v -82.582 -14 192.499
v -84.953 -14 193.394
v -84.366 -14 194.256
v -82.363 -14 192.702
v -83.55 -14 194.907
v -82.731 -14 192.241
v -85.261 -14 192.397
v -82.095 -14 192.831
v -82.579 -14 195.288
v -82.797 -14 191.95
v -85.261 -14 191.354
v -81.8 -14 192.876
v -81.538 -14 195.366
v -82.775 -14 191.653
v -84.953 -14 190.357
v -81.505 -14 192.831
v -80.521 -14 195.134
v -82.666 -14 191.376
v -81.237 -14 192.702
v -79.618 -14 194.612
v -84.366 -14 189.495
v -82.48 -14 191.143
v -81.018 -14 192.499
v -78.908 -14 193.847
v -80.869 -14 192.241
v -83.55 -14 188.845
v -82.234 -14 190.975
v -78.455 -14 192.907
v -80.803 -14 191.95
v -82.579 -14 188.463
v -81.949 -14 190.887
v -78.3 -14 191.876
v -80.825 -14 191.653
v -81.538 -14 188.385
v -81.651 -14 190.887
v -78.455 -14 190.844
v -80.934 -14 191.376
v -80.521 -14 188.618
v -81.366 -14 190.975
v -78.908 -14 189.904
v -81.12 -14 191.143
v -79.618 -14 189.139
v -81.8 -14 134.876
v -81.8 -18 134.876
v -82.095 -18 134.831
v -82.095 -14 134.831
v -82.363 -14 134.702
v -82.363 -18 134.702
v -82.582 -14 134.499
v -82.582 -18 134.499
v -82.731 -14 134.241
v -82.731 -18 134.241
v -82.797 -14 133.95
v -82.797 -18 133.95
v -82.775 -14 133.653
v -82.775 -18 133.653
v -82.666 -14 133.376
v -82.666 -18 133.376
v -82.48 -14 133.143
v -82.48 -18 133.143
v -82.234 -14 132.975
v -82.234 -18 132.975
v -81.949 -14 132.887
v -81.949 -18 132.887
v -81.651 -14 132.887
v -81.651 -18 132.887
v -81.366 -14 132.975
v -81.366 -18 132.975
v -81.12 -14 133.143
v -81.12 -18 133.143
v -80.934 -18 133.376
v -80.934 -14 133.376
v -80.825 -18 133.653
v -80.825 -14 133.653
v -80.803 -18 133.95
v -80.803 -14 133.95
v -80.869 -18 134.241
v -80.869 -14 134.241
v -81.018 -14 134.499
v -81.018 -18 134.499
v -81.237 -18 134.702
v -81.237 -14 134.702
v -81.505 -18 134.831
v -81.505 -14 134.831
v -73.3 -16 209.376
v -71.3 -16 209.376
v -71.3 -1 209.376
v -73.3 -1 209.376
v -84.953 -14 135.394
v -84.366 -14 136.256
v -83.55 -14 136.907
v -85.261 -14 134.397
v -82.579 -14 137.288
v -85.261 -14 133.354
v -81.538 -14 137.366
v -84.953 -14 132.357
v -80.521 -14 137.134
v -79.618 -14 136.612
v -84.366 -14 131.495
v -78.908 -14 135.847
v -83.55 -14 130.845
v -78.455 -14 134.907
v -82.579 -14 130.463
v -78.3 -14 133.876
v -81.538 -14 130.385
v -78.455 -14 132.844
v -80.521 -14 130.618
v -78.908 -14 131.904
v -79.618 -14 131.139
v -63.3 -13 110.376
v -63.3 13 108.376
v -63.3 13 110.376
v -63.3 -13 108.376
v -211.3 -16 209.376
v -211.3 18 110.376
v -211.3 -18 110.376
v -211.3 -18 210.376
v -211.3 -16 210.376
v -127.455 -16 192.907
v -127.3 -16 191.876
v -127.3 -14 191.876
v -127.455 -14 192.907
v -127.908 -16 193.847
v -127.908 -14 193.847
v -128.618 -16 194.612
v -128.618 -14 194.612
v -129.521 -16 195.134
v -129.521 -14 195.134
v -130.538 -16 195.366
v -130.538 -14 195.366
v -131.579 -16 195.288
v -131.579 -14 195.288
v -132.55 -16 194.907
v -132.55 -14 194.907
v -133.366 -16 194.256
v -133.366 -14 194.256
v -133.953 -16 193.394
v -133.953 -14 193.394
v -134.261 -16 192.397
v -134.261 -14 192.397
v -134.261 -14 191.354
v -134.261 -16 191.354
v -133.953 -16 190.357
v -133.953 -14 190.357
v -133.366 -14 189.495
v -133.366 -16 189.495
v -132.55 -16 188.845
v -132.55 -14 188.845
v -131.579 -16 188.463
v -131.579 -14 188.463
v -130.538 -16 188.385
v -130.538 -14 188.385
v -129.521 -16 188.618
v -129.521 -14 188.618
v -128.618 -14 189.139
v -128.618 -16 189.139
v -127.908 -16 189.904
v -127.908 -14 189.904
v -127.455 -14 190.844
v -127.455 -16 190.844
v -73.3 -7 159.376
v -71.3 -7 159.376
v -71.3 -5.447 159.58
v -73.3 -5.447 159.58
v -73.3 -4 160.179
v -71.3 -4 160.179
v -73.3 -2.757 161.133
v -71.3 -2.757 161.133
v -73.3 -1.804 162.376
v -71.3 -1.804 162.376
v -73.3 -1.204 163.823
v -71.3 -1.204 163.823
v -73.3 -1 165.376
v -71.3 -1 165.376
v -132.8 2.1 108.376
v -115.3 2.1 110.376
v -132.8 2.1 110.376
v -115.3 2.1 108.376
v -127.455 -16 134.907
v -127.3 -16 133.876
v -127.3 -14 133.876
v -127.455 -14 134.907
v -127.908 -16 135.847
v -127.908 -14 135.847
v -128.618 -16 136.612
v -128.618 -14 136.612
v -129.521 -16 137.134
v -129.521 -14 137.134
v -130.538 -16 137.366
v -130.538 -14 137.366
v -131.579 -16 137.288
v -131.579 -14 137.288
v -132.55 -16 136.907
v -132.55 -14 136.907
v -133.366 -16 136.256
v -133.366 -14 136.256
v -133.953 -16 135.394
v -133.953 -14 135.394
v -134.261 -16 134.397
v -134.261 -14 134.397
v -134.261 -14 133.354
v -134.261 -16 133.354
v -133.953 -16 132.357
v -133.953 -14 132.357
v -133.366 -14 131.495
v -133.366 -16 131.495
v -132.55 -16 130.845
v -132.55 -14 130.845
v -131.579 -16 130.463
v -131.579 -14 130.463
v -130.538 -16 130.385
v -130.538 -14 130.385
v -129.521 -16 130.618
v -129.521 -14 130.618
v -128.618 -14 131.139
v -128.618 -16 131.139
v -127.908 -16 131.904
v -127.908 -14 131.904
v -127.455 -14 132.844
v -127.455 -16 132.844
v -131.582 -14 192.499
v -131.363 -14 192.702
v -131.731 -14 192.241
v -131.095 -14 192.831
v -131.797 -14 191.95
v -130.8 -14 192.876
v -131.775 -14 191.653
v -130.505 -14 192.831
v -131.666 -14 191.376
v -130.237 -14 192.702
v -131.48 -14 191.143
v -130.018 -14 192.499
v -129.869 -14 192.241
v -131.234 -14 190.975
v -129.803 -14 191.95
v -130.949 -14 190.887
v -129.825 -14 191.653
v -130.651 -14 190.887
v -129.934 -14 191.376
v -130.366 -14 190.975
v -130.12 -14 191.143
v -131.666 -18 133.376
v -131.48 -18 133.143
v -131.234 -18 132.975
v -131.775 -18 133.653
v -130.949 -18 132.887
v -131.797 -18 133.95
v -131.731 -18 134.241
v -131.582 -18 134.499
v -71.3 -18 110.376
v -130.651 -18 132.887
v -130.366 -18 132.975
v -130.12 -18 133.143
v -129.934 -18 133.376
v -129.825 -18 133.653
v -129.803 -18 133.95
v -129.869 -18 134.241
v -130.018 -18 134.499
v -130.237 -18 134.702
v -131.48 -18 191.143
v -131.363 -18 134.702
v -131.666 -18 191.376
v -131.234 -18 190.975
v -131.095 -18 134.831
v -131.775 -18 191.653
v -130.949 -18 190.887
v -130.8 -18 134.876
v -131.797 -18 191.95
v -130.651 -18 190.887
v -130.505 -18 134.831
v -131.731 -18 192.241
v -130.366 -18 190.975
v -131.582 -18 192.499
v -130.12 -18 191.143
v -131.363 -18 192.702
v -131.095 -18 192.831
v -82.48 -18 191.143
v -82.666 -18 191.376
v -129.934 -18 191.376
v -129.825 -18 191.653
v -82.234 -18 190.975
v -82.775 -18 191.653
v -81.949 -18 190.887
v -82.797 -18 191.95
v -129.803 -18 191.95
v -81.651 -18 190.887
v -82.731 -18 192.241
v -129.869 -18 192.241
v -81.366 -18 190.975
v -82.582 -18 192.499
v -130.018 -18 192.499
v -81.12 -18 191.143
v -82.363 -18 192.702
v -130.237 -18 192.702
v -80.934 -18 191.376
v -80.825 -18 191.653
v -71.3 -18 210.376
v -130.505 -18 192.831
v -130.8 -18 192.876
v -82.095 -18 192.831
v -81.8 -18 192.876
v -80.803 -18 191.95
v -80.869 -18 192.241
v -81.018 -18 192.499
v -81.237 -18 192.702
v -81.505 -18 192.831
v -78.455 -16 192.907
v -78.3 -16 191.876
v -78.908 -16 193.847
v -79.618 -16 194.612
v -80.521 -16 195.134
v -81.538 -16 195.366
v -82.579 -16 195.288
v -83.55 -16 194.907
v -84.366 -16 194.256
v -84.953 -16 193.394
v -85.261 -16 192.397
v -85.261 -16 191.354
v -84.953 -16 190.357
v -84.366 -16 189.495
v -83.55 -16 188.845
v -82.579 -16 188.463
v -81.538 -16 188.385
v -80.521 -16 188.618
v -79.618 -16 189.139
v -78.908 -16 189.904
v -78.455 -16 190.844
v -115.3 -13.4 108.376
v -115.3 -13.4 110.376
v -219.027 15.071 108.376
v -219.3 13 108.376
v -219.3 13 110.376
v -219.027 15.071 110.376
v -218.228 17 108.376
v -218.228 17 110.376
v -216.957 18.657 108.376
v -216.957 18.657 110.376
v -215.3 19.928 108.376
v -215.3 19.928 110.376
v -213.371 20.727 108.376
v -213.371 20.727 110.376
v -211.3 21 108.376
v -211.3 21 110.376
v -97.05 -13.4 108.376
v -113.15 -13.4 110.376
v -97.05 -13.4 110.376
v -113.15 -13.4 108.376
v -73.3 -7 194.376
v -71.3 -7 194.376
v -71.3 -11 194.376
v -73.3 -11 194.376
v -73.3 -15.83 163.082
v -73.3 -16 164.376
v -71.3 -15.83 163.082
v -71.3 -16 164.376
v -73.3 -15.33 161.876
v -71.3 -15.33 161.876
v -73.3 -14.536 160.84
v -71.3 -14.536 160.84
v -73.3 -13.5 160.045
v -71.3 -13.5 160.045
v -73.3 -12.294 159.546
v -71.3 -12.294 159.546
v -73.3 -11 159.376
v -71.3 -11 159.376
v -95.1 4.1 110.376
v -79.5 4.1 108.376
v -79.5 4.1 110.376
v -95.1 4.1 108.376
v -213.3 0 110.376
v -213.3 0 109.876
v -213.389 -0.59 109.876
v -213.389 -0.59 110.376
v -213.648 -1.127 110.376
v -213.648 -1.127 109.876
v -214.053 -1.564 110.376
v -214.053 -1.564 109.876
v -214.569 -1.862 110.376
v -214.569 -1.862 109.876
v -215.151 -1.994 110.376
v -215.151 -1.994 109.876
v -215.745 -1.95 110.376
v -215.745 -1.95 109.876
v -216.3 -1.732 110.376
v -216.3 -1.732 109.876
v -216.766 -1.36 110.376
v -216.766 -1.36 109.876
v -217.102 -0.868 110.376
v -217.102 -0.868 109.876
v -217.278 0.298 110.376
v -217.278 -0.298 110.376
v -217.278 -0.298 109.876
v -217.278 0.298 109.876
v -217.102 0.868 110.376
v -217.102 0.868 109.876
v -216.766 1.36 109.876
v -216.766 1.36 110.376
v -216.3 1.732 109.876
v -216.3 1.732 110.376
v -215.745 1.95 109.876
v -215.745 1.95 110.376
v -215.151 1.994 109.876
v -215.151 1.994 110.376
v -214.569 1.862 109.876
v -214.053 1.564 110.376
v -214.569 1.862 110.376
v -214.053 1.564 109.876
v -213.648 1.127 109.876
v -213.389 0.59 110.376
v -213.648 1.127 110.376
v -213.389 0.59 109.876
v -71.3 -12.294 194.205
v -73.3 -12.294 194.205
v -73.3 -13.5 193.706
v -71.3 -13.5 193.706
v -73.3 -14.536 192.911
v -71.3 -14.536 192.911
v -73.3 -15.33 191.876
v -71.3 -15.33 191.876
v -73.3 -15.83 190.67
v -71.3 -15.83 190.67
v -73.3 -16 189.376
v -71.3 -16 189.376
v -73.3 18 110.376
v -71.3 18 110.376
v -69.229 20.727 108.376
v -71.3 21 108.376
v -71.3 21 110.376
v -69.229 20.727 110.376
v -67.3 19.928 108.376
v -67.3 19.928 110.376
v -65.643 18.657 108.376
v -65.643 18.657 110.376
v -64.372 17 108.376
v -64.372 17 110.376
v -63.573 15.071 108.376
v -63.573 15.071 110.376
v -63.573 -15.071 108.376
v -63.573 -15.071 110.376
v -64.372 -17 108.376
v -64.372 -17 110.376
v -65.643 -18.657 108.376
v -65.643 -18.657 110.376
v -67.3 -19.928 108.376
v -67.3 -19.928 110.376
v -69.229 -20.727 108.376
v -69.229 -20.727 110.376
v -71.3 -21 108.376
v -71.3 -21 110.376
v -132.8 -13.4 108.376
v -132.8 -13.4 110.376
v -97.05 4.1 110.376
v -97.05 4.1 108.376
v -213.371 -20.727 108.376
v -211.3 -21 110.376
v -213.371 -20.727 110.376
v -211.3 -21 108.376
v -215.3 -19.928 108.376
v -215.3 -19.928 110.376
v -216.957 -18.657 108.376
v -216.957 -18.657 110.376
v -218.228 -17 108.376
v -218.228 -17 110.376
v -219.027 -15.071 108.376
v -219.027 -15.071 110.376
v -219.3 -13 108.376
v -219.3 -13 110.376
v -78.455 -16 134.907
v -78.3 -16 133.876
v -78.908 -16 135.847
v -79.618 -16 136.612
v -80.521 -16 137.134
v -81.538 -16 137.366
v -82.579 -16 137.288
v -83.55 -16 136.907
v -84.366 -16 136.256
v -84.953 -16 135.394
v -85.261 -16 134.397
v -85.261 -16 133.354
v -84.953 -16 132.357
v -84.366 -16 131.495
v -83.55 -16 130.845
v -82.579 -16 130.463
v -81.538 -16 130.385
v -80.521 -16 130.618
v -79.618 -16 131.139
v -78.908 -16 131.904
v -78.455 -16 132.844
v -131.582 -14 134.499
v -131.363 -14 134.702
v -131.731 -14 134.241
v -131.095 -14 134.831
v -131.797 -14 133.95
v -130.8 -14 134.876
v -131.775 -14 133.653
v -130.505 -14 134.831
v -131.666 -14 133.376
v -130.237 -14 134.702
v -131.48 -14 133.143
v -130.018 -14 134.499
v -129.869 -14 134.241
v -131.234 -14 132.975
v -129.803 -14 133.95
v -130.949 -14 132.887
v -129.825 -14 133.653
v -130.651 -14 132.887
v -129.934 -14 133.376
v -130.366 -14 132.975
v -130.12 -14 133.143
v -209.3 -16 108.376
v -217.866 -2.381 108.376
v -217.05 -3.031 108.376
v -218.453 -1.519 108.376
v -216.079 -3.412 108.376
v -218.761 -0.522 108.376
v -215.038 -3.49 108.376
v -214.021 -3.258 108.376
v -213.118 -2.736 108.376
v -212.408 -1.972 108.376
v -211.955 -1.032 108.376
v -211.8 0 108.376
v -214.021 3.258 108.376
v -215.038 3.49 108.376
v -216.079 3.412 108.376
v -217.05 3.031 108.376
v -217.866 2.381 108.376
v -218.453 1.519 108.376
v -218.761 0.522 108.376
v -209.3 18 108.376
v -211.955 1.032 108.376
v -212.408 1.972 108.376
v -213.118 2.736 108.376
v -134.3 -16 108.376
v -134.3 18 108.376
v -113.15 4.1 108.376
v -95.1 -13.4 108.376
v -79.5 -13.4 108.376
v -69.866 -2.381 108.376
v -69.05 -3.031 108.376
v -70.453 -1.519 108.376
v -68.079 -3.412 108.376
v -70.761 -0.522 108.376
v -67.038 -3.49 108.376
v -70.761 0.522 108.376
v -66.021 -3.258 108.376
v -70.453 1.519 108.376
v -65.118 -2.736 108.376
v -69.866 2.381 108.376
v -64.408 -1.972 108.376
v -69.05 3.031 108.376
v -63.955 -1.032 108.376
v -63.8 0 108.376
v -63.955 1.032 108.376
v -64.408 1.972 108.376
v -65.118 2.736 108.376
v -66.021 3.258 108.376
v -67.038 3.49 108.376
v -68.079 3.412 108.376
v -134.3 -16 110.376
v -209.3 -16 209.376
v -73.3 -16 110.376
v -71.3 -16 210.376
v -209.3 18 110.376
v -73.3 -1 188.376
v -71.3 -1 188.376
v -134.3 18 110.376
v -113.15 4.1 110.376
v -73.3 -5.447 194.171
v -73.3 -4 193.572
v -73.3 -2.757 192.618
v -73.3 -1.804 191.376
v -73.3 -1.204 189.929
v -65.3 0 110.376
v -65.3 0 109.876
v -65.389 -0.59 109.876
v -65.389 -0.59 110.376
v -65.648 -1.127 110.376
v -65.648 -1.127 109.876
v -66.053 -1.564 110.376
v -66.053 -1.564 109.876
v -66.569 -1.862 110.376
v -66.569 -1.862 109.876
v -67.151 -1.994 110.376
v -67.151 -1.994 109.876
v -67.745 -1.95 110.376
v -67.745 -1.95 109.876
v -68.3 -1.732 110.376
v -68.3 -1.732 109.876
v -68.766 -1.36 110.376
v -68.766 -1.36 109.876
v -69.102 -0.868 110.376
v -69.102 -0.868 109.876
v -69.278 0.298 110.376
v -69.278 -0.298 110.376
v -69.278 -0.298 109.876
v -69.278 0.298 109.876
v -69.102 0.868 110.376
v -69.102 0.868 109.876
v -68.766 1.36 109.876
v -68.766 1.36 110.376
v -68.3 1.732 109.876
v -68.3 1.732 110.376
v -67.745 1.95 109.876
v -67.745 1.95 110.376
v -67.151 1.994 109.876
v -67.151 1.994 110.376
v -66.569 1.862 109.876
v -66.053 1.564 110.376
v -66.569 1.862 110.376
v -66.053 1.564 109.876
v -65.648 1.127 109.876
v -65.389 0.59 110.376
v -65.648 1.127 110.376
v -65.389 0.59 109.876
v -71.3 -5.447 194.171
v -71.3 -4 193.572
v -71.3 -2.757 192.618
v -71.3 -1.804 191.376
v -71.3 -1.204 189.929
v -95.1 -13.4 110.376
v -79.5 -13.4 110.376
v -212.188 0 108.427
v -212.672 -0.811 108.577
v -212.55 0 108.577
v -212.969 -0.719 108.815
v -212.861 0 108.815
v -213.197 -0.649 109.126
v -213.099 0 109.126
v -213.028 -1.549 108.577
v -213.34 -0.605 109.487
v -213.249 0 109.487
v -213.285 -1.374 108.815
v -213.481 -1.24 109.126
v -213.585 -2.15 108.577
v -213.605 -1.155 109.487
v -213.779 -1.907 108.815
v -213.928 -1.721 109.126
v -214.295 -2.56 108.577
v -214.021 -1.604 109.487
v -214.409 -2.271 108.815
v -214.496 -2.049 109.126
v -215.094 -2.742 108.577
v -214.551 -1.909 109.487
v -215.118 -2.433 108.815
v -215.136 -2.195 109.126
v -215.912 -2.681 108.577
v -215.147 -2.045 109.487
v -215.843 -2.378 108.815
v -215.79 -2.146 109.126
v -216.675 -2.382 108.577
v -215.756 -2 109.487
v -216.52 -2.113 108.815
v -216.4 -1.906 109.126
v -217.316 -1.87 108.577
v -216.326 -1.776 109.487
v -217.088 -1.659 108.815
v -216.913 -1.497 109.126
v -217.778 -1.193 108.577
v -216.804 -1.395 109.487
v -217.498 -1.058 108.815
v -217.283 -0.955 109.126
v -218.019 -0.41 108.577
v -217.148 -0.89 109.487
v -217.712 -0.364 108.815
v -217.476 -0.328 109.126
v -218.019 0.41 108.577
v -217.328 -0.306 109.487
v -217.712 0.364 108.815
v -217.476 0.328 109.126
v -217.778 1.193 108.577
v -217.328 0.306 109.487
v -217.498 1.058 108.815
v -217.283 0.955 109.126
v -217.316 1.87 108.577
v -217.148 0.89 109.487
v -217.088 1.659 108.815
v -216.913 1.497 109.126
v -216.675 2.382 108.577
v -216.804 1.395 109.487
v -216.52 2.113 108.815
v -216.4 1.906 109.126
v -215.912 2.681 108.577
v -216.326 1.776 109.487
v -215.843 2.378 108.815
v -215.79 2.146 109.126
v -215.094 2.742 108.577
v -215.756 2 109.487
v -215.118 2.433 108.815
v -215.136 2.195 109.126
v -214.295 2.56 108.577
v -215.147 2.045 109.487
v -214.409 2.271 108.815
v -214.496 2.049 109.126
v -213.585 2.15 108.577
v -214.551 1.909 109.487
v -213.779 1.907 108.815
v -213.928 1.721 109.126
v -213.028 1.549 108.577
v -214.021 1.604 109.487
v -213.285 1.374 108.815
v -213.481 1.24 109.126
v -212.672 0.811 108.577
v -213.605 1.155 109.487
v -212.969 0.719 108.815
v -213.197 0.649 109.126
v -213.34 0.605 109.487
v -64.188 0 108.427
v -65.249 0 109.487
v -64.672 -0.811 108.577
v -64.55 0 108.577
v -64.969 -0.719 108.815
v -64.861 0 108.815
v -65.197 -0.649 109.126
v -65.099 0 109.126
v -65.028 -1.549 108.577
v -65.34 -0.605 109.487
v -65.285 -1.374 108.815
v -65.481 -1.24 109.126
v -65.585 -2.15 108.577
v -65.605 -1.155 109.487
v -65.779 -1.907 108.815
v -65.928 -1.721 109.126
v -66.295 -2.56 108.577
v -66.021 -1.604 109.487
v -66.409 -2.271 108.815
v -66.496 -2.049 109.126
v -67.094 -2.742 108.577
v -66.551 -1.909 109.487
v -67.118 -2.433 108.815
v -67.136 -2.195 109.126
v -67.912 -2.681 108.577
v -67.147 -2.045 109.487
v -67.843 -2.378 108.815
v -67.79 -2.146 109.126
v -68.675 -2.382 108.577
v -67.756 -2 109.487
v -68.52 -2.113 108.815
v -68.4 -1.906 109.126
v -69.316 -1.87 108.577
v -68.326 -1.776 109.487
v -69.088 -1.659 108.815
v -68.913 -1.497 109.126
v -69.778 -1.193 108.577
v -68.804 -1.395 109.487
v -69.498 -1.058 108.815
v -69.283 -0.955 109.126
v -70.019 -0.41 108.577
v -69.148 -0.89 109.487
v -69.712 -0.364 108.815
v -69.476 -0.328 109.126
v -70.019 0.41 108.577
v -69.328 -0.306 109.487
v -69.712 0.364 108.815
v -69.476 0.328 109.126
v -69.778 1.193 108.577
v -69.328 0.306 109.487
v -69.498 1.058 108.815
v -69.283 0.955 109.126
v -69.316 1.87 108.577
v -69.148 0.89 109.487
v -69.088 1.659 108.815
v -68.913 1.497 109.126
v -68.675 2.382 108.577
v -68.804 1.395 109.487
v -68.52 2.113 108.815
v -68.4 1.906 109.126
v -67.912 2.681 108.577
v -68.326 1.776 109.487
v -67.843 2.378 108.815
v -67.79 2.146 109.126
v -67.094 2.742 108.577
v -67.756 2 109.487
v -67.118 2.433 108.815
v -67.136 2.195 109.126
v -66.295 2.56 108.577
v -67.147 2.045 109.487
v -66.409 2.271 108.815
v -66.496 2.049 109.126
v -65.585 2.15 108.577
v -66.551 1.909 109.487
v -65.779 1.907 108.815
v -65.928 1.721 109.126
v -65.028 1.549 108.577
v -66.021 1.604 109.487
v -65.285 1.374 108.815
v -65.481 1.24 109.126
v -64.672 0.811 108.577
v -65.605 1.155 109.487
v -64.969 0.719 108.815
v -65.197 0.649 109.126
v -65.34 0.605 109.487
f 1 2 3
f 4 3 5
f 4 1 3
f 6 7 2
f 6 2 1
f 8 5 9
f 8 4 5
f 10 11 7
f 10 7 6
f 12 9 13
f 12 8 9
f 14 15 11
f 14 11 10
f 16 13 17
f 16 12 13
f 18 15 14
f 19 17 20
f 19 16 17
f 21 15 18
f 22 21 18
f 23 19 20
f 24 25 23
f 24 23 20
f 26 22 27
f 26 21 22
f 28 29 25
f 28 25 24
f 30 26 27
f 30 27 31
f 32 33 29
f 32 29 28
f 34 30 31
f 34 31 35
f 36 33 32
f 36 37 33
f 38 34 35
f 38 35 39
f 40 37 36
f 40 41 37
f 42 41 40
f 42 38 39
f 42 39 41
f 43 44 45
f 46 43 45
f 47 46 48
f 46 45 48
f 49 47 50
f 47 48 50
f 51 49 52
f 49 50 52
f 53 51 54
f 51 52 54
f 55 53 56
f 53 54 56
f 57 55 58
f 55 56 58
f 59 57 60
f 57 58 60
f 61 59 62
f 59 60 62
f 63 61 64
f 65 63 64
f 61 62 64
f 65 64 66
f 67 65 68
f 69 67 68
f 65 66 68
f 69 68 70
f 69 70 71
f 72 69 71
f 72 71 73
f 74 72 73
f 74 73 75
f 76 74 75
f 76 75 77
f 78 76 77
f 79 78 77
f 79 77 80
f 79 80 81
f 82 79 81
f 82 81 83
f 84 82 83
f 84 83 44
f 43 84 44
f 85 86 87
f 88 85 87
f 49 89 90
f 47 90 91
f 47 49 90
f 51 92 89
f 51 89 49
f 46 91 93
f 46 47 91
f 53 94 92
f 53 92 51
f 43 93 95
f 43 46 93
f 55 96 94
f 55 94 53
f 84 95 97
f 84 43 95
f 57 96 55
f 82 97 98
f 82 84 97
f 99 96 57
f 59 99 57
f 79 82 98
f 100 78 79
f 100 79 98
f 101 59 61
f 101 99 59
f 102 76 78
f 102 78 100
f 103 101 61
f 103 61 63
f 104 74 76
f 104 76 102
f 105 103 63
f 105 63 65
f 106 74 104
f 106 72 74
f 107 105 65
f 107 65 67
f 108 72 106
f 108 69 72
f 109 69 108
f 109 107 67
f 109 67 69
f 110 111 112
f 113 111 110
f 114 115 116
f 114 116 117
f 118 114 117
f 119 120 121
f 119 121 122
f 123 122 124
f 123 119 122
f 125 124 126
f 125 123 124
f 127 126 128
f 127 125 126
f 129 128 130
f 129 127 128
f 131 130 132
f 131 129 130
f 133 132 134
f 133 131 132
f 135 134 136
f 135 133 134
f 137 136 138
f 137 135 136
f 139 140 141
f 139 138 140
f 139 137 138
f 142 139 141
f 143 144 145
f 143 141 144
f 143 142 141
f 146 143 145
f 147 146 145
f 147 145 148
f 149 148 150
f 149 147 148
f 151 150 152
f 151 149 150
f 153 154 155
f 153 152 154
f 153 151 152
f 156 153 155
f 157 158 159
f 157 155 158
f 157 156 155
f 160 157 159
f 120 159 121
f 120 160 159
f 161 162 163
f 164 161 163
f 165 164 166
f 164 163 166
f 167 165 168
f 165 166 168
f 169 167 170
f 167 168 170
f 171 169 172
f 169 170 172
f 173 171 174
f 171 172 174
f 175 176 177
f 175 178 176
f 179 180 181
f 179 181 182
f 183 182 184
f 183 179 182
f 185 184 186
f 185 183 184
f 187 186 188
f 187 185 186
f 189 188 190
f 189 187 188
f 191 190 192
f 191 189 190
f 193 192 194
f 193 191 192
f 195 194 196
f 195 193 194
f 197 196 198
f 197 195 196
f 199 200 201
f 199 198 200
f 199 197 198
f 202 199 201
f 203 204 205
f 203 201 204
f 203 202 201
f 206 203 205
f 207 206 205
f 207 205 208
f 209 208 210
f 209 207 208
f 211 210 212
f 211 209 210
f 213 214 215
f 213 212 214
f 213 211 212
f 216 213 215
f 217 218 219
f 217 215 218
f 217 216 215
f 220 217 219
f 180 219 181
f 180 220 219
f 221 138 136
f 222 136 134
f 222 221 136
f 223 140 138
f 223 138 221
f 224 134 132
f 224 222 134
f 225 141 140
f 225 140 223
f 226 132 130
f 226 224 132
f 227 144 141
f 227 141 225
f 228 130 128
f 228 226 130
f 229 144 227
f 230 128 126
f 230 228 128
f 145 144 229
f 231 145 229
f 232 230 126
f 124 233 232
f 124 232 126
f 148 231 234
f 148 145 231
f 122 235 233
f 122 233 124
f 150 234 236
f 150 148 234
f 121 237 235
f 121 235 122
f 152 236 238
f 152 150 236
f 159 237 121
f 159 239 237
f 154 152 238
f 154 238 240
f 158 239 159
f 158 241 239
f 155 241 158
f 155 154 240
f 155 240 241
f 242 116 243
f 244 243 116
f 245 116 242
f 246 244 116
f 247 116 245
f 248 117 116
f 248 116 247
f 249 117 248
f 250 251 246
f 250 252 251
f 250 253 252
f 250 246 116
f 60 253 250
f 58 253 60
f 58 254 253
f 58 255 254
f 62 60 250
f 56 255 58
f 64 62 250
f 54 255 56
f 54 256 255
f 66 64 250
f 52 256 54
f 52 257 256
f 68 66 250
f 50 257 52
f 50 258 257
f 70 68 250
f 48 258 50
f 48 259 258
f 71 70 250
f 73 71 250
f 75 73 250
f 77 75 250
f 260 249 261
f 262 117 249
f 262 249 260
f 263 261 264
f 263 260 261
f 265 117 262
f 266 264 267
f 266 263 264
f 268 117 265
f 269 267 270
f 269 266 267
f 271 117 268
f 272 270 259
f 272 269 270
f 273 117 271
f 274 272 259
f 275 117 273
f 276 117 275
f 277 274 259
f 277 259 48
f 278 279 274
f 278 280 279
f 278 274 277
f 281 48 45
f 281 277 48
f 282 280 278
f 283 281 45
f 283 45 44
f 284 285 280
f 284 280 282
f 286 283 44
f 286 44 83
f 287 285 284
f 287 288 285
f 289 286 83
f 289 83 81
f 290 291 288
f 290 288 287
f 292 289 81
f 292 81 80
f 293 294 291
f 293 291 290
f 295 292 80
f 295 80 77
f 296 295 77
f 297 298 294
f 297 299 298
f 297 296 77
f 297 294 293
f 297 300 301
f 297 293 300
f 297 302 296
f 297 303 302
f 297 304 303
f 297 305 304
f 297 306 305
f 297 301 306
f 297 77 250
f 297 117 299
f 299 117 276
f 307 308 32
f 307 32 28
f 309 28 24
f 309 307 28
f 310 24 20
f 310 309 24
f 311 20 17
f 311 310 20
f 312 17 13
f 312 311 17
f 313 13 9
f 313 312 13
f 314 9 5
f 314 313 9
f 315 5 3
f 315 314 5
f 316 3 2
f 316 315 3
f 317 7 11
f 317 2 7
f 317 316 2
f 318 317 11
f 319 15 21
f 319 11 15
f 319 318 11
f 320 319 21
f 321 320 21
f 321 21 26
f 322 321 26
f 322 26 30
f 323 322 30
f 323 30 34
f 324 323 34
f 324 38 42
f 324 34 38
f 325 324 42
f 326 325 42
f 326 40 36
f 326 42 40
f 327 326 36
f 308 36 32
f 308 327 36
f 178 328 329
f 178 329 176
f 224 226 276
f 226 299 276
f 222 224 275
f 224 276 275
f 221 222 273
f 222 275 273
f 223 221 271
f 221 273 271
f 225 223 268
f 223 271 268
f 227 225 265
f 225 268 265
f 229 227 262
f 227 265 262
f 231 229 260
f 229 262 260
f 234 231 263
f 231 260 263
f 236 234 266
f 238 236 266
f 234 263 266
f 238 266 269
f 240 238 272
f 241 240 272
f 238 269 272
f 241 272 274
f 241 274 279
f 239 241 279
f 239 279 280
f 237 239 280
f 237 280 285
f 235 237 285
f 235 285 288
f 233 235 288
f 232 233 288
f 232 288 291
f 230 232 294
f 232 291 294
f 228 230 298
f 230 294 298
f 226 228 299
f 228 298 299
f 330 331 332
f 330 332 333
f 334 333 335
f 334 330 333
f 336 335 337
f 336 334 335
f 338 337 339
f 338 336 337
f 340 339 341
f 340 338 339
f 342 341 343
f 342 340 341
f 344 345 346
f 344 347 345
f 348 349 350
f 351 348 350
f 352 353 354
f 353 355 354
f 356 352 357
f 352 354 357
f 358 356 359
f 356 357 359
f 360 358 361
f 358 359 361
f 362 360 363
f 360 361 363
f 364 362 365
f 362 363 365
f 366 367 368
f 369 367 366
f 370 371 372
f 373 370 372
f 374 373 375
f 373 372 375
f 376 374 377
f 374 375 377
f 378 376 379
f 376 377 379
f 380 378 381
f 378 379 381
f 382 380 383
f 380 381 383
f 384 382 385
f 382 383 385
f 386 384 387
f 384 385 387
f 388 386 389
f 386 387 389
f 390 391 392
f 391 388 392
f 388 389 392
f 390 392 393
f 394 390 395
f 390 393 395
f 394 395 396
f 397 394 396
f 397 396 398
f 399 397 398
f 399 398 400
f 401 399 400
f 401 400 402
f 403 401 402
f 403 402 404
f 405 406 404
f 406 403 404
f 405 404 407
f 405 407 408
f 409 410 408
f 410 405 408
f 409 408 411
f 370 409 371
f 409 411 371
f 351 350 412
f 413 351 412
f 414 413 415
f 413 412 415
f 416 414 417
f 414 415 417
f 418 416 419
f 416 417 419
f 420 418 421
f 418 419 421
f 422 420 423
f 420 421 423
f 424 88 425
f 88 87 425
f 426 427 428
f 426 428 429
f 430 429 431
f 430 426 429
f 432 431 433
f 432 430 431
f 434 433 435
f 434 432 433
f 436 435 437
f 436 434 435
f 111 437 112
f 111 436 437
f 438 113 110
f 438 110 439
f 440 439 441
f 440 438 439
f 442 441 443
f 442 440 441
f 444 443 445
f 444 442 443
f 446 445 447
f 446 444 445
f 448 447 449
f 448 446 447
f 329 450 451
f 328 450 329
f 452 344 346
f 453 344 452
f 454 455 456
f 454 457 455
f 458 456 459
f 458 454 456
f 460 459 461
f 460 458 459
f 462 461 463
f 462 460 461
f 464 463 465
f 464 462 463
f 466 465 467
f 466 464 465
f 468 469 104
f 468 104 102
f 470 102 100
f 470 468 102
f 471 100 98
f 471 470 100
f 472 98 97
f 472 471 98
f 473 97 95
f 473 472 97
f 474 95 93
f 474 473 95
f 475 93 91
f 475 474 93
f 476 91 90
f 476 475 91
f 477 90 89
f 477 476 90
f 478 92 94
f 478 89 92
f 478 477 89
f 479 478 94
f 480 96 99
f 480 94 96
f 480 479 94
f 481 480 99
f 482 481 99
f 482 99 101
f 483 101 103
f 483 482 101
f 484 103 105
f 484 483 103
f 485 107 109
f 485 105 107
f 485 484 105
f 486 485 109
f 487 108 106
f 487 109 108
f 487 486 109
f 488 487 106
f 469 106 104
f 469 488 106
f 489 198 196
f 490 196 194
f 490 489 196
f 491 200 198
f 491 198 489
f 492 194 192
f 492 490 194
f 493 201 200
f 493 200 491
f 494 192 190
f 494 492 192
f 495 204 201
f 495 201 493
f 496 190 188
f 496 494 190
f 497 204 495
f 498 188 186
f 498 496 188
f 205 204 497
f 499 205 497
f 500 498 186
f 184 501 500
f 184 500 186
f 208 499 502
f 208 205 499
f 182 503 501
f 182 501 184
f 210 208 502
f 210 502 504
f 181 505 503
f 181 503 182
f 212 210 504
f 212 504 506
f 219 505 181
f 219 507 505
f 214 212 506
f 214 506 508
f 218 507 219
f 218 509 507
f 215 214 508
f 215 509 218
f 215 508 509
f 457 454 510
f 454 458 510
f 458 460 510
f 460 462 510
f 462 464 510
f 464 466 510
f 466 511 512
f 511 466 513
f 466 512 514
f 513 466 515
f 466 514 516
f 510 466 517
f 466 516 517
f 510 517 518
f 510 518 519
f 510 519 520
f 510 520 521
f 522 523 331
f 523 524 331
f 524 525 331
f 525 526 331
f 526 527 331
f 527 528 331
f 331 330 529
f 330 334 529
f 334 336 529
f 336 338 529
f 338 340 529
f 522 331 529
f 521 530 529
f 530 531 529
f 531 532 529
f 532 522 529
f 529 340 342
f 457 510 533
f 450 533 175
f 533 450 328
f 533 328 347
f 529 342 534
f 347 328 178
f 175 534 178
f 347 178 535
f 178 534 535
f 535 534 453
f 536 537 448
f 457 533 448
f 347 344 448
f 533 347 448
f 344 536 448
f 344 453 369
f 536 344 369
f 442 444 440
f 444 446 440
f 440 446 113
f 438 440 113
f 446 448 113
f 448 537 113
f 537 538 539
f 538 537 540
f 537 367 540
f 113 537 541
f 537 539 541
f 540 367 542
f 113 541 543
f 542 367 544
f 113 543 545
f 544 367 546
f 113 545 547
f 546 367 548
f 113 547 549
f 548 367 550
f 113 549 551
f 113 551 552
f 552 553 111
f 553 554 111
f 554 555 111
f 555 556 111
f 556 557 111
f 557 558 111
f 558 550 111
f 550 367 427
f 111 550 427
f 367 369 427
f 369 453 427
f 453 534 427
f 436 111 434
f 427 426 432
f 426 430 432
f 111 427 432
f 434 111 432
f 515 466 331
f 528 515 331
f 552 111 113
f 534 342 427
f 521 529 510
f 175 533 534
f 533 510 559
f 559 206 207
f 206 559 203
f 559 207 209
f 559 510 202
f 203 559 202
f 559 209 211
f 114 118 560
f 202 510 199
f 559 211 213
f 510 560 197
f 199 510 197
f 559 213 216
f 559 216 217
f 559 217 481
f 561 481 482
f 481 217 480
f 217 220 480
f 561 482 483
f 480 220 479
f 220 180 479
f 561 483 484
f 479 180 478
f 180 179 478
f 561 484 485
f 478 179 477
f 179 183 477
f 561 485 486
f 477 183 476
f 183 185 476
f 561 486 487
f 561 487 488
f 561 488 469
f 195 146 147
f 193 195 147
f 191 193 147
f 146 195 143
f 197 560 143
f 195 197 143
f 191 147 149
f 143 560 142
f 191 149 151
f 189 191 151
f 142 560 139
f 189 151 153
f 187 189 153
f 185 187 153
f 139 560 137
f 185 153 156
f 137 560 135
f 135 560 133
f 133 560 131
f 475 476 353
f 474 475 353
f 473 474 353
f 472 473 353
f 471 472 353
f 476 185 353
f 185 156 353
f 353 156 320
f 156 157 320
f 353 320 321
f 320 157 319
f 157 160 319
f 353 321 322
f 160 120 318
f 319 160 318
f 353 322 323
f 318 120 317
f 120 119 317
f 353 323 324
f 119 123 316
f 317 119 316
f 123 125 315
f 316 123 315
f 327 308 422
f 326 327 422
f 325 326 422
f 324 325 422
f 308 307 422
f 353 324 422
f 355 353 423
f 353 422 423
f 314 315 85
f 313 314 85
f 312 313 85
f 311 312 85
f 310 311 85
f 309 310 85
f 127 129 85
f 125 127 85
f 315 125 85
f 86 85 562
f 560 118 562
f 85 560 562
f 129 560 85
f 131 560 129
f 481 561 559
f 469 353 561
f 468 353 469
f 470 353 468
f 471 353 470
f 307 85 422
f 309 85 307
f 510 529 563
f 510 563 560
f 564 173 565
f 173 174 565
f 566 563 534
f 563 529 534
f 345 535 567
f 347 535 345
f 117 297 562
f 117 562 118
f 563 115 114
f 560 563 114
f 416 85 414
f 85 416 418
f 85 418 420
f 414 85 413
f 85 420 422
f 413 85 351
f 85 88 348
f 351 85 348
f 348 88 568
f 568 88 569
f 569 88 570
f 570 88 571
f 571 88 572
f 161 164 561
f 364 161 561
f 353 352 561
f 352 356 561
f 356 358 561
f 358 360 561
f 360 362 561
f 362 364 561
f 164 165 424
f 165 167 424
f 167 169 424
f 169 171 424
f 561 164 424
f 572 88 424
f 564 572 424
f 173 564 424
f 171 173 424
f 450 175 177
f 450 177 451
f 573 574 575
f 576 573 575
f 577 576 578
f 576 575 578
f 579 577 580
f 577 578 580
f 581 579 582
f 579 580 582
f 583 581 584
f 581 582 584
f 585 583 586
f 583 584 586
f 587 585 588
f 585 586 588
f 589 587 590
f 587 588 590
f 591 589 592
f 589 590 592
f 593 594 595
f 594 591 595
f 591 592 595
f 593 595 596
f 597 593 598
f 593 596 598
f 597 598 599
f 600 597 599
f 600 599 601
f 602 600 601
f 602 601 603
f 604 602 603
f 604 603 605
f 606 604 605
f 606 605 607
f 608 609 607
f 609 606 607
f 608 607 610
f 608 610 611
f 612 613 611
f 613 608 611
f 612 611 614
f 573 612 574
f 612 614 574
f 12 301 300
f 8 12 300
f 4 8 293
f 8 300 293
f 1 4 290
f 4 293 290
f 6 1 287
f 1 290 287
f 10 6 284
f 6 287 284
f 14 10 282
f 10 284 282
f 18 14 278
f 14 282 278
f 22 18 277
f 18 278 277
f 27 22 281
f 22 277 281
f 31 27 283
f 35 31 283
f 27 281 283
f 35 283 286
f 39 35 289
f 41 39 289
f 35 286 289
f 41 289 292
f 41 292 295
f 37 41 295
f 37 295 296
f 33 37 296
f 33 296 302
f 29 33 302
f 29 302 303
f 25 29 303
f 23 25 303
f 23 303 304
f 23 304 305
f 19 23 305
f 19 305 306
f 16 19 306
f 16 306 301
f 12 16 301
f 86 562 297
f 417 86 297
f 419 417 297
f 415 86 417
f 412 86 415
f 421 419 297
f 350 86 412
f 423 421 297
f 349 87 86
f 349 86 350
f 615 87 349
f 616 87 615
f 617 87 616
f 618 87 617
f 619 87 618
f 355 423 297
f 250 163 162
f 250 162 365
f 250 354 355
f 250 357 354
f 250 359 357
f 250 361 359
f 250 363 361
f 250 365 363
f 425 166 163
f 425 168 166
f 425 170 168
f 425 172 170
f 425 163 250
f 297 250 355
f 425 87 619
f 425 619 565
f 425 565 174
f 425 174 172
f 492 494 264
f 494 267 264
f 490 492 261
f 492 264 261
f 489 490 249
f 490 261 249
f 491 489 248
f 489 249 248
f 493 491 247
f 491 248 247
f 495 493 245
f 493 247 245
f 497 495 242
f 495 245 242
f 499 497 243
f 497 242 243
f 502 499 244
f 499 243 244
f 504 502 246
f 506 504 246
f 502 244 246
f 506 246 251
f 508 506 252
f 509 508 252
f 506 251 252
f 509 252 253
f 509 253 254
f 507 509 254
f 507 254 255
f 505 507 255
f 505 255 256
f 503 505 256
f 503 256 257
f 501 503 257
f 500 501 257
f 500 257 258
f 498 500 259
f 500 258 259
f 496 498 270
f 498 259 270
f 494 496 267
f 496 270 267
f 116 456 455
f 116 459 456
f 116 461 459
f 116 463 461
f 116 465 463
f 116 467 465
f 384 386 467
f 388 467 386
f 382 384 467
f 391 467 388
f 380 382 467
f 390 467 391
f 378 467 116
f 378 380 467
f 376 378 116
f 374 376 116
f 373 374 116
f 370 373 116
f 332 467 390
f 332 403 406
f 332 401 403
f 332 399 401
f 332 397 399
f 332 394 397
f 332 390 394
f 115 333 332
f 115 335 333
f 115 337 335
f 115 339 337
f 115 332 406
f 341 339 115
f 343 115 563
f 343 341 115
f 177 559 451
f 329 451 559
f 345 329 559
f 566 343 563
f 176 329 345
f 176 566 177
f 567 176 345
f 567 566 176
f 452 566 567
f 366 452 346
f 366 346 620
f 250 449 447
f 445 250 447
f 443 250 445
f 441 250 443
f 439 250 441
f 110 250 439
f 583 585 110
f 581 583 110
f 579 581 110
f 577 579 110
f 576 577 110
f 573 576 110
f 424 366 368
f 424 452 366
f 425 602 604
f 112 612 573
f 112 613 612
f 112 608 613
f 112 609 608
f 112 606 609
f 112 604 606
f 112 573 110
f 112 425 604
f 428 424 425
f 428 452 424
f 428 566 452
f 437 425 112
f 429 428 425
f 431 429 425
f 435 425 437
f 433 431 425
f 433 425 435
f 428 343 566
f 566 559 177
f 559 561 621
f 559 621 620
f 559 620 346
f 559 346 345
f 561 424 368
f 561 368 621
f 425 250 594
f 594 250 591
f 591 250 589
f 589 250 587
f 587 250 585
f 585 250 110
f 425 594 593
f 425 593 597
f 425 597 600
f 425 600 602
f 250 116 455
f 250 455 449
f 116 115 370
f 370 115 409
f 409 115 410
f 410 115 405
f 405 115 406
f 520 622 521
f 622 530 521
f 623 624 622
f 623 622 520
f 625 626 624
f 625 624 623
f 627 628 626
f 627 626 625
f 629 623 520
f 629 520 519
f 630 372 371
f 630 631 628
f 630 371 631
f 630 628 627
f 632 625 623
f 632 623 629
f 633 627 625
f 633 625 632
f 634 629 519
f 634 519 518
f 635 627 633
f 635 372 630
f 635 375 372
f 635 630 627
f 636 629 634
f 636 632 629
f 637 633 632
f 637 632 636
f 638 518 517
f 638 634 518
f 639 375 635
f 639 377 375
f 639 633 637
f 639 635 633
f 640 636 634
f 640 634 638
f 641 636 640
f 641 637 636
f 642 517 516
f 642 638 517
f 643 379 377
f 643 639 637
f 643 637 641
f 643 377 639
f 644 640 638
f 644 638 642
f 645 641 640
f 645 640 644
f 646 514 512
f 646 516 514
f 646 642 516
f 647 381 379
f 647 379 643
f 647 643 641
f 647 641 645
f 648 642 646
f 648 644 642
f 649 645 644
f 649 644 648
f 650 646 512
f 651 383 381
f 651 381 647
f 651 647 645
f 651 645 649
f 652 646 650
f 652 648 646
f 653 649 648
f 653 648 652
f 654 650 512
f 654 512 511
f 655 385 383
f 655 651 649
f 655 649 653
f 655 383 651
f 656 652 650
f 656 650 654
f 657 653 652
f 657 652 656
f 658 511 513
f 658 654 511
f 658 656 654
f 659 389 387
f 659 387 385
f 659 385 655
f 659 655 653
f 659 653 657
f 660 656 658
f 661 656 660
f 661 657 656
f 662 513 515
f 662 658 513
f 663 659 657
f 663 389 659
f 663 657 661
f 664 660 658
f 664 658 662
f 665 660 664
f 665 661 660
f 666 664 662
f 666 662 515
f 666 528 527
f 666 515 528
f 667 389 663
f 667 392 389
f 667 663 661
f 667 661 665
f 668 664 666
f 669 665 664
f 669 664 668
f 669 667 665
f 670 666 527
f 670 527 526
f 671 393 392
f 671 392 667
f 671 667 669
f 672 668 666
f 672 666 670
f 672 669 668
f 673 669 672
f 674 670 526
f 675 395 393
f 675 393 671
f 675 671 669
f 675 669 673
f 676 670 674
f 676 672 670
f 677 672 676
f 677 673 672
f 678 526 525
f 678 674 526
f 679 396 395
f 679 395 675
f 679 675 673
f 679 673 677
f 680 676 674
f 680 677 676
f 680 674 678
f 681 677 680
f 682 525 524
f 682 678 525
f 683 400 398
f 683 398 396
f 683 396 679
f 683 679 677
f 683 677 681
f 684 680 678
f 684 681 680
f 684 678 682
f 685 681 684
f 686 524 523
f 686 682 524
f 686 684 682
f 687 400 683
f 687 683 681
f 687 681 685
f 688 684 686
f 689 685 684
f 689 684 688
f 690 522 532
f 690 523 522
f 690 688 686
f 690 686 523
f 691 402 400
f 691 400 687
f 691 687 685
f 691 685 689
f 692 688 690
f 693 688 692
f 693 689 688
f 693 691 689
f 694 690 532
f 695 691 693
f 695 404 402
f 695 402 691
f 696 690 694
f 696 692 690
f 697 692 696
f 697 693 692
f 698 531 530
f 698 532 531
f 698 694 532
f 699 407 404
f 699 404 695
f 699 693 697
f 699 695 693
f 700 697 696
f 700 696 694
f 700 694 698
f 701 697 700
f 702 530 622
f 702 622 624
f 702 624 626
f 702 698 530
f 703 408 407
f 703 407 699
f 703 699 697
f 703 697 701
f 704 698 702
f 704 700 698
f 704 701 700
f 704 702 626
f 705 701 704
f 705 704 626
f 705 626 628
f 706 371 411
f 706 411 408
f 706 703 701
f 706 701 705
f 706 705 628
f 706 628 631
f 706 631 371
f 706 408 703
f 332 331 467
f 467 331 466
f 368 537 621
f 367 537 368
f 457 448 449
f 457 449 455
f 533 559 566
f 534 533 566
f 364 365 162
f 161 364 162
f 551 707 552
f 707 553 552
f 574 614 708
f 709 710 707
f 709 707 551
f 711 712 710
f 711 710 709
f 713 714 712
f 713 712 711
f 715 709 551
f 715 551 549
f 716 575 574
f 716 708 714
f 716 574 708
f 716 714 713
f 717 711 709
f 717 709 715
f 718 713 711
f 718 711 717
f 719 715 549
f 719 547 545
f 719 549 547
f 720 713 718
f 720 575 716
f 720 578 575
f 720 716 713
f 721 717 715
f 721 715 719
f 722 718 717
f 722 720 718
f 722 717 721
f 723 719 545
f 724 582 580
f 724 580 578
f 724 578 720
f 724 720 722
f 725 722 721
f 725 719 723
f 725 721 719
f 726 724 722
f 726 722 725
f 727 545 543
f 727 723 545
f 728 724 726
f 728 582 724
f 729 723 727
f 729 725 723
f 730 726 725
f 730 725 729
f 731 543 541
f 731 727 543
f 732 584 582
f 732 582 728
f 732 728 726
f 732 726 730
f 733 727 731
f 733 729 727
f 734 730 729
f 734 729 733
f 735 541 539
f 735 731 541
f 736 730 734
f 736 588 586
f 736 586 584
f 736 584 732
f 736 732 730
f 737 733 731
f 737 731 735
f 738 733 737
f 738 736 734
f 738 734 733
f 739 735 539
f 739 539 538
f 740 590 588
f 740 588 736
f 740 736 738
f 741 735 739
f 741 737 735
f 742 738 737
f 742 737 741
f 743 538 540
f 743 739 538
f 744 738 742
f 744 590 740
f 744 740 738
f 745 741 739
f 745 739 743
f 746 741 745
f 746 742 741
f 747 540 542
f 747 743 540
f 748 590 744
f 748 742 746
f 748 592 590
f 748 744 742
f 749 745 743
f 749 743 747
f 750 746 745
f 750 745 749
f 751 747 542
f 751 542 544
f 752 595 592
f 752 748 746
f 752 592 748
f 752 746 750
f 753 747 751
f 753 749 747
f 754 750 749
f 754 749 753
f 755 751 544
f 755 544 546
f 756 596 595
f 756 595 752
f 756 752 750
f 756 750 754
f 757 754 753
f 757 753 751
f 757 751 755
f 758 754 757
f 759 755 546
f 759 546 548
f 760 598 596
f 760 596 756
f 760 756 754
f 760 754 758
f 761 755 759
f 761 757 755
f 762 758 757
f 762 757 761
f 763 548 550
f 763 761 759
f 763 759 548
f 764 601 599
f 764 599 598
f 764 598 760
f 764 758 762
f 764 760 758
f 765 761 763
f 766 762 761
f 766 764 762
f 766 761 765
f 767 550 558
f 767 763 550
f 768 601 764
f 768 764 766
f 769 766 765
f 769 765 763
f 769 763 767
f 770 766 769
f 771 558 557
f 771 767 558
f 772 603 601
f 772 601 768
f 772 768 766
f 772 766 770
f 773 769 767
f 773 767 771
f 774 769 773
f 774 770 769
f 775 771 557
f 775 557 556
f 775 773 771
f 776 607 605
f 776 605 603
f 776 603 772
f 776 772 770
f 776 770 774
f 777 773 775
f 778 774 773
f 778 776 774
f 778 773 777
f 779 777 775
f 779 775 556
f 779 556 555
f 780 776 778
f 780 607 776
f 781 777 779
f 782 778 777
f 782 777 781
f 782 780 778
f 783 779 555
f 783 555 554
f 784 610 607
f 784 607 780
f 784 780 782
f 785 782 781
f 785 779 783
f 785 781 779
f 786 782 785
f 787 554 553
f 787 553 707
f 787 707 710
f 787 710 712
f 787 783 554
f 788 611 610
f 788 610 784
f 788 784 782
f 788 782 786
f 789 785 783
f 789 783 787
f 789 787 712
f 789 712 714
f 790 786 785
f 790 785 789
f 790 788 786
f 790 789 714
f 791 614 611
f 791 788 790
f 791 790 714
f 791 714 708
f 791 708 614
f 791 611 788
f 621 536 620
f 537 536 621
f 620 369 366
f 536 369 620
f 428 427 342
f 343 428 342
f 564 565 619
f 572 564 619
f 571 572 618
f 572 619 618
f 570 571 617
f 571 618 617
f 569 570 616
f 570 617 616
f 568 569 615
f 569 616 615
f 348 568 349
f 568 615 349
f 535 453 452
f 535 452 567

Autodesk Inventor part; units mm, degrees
ref_plane "YZ Plane" through (0, 0, 0) normal (1, 0, 0) x (0, 1, 0)
ref_plane "XZ Plane" through (0, 0, 0) normal (0, 1, 0) x (-1, 0, 0)
ref_plane "XY Plane" through (0, 0, 0) normal (0, 0, 1) x (1, 0, 0)
ref_plane "Work Plane1" through (0, 0, 108.3756) normal (0, 0, 1) x (1, 0, 0)
sketch "Sketch1" plane through (0, 0, 108.3756) normal (0, 0, 1) x (1, 0, 0)
  line L0 (-71.3, 18) -> (-71.3, -18)
  line L1 (-71.3, -18) -> (-211.3, -18)
  line L2 (-211.3, -18) -> (-211.3, 18)
  line L3 (-211.3, 18) -> (-71.3, 18)
  line L4 (71.3003, -18) -> (71.3003, 18)
  line L5 (71.3003, 18) -> (211.3003, 18)
  line L6 (211.3003, 18) -> (211.3003, -18)
  line L7 (211.3003, -18) -> (71.3003, -18)
  line L8 (-241.3, 22) -> (241.3, 22)
  line L9 (-241.3, -22) -> (-241.3, 22)
  line L10 (241.3, -22) -> (-241.3, -22)
  line L11 (241.3, 22) -> (241.3, -22)
  circle A0 centre (-232.5, -15.875) radius 3.5
  circle A1 centre (-232.5, 15.875) radius 3.5
  circle A2 centre (232.5, -15.875) radius 3.5
  circle A3 centre (232.5, 15.875) radius 3.5
  line L12 (-219.3, 10) -> (-219.3, -10)
  line L13 (-63.3, 10) -> (-63.3, -10)
  arc A4 (-211.3, 18) -> (-219.3, 10) centre (-211.3, 10) ccw
  arc A5 (-219.3, -10) -> (-211.3, -18) centre (-211.3, -10) ccw
  arc A6 (-63.3, 10) -> (-71.3, 18) centre (-71.3, 10) ccw
  arc A7 (-71.3, -18) -> (-63.3, -10) centre (-71.3, -10) ccw
  line L14 (-211.3, 18) -> (-71.3, 18)
  line L15 (-71.3, -18) -> (-211.3, -18)
  circle A8 centre (-215.3, 0) radius 2
  circle A9 centre (-67.3, 0) radius 2
  point P0 (0, 0)
  point P1 (-63.3, 0)
  dimension "d0" = 8
  dimension "d1" = 8
  dimension "d5" = 4
  dimension "d6" = 4
  dimension "d7" = 18
  dimension "d9" = 4
  dimension "d106" = 18
extrude "Extrusion2" add sketch "Sketch1" along normal blind 2 contours A6 L13 A7 L0 | L0 L1 L2 L3 | L2 A5 L12 A4
ref_plane "Work Plane4" through (-211.3, -18, 108.3756) normal (0, -1, 0) x (1, 0, 0)
sketch "Sketch3" plane through (-211.3, -18, 108.3756) normal (0, -1, 0) x (1, 0, 0)
  line L0 (0, 2) -> (140, 2)
  line L1 (0, 2) -> (140, 2)
  line L2 (140, 2) -> (140, 102)
  line L3 (140, 102) -> (0, 102)
  line L4 (0, 102) -> (0, 2)
  point P0 (211.3, -108.3756)
  point P1 (140, 2)
  dimension "d14" = 100
  dimension "d15" = 0
extrude "Extrusion3" add sketch "Sketch3" against normal blind 2
ref_plane "Work Plane5" through (-71.3, -18, 210.3756) normal (1, 0, 0) x (0, 0, -1)
sketch "Sketch4" plane through (-71.3, -18, 210.3756) normal (1, 0, 0) x (0, 0, -1)
  line L0 (0, 2) -> (100, 2)
  line L1 (100, 2) -> (1, 2)
  line L2 (1, 2) -> (100, 36)
  line L3 (100, 36) -> (100, 2)
  point P0 (210.3756, 18)
  dimension "d19" = 99
extrude "Side" add sketch "Sketch4" against normal blind 2
ref_plane "Work Plane6" through (-211.3, -18, 110.3756) normal (-1, 0, 0) x (0, 0, 1)
sketch "Sketch5" plane through (-211.3, -18, 110.3756) normal (-1, 0, 0) x (0, 0, 1)
  line L0 (0, 2) -> (100, 2)
  line L1 (0, 2) -> (99, 2)
  line L2 (0, 36) -> (99, 2)
  line L3 (0, 36) -> (99, 2)
  line L4 (0, 36) -> (0, 2)
  point P0 (-110.3756, 18)
extrude "Extrusion5" add sketch "Sketch5" against normal blind 2
sketch "Sketch7" plane through (0, 0, 110.3756) normal (0, 0, 1) x (1, 0, 0)
  line L0 (-209.3, -16) -> (-73.3, -16)
  line L1 (-129.3, -16) -> (-204.3, -16)
  line L2 (-134.3, 18) -> (-209.3, 18)
  line L3 (-134.3, -18) -> (-134.3, 18)
  line L4 (-209.3, 18) -> (-209.3, -16)
  line L5 (-209.3, -18) -> (-134.3, -18)
  line L6 (-209.3, -18) -> (-134.3, -18)
  line L7 (-209.3, 18) -> (-134.3, 18)
  line L8 (-134.3, 18) -> (-134.3, -18)
  line L9 (-134.3, -18) -> (-209.3, -18)
  line L10 (-209.3, -18) -> (-209.3, 18)
  point P0 (0, 0)
  point P1 (-134.3, -16)
extrude "Extrusion7" cut sketch "Sketch7" against normal through all contours L4 L2 L3 L0
sketch "Sketch14" plane through (0, 0, 108.3756) normal (0, 0, -1) x (-1, 0, 0)
  line L0 (116.3, 1.1) -> (131.8, 1.1)
  line L1 (110.85, 3.1) -> (99.75, 3.1)
  line L2 (80.95, 3.1) -> (93.65, 3.1)
  line L3 (131.8, -12.2) -> (131.8, 0.9)
  line L4 (116.3, 0.9) -> (116.3, -12.2)
  line L5 (112.15, -1.76) -> (112.15, 2.24)
  line L6 (112.15, -10.26) -> (112.15, -6.26)
  line L7 (98.05, -6.56) -> (98.05, -9.96)
  line L8 (98.05, 1.94) -> (98.05, -1.46)
  line L9 (81.3, -12.4) -> (131.3, -12.4)
  line L10 (94.1, -5.96) -> (94.1, -9.76)
  line L11 (94.1, -2.3) -> (94.1, 1.5)
  line L12 (80.5, -2.3) -> (80.5, 1.5)
  line L13 (80.5, -5.96) -> (80.5, -9.76)
  line L14 (79.5, 4.1) -> (95.1, 4.1)
  line L15 (95.1, 4.1) -> (95.1, -13.4)
  line L16 (95.1, -13.4) -> (79.5, -13.4)
  line L17 (79.5, -13.4) -> (79.5, 4.1)
  line L18 (97.05, 4.1) -> (113.15, 4.1)
  line L19 (113.15, 4.1) -> (113.15, -13.4)
  line L20 (113.15, -13.4) -> (97.05, -13.4)
  line L21 (97.05, -13.4) -> (97.05, 4.1)
  line L22 (115.3, 2.1) -> (132.8, 2.1)
  line L23 (132.8, 2.1) -> (132.8, -13.4)
  line L24 (132.8, -13.4) -> (115.3, -13.4)
  line L25 (115.3, -13.4) -> (115.3, 2.1)
  point P0 (0, 0)
  dimension "d54" = 1
  dimension "d55" = 1
  dimension "d56" = 1
  dimension "d58" = 1
  dimension "d59" = 1
  dimension "d60" = 1
  dimension "d61" = 1
  dimension "d62" = 1
  dimension "d63" = 1
  dimension "d64" = 1
  dimension "d65" = 1
  dimension "d66" = 1
extrude "Extrusion12" cut sketch "Sketch14" against normal up to surface (2 mm away)
fillet "Fillet1" radius 1.5 2 edges at (-69.3, 0, 108.3756) (-217.3, 0, 108.3756)
sketch "Sketch19" plane through (0, 0, 108.3756) normal (0, 0, -1) x (-1, 0, 0)
  circle A0 centre (67.3, 0) radius 3.5
  line L0 (79.5, 4.1) -> (95.1, 4.1)
  line L1 (95.1, 4.1) -> (95.1, -13.4)
  line L2 (95.1, -13.4) -> (79.5, -13.4)
  line L3 (79.5, -13.4) -> (79.5, 4.1)
  line L4 (132.8, -13.4) -> (115.3, -13.4)
  line L5 (115.3, -13.4) -> (115.3, 2.1)
  line L6 (115.3, 2.1) -> (132.8, 2.1)
  line L7 (132.8, 2.1) -> (132.8, -13.4)
  line L8 (97.05, -13.4) -> (97.05, 4.1)
  line L9 (97.05, 4.1) -> (113.15, 4.1)
  line L10 (113.15, 4.1) -> (113.15, -13.4)
  line L11 (113.15, -13.4) -> (97.05, -13.4)
  line L12 (209.3, 18) -> (209.3, -16)
  line L13 (209.3, -16) -> (134.3, -16)
  line L14 (134.3, -16) -> (134.3, 18)
  line L15 (71.3, 18) -> (134.3, 18)
  arc A1 (71.3, 18) -> (63.3, 10) centre (71.3, 10) ccw
  line L16 (63.3, -10) -> (63.3, 10)
  arc A2 (63.3, -10) -> (71.3, -18) centre (71.3, -10) ccw
  line L17 (211.3, -18) -> (71.3, -18)
  arc A3 (211.3, -18) -> (219.3, -10) centre (211.3, -10) ccw
  line L18 (219.3, 10) -> (219.3, -10)
  arc A4 (219.3, 10) -> (211.3, 18) centre (211.3, 10) ccw
  line L19 (209.3, 18) -> (211.3, 18)
  circle A5 centre (215.3, 0) radius 3.5
  line L20 (71.3, 21) -> (211.3, 21)
  line L21 (63.3, 10) -> (63.3, 13)
  line L22 (63.3, -10) -> (63.3, -13)
  line L23 (219.3, 10) -> (219.3, 13)
  line L24 (219.3, -10) -> (219.3, -13)
  line L25 (71.3, -21) -> (211.3, -21)
  arc A6 (211.3, -21) -> (219.3, -13) centre (211.3, -13) ccw
  arc A7 (219.3, 13) -> (211.3, 21) centre (211.3, 13) ccw
  arc A8 (71.3, 21) -> (63.3, 13) centre (71.3, 13) ccw
  arc A9 (63.3, -13) -> (71.3, -21) centre (71.3, -13) ccw
  line L26 (209.3, 18) -> (134.3, 18)
  point P0 (0, 0)
  dimension "d108" = 3
  dimension "d109" = 3
  dimension "d110" = 3
  dimension "d111" = 3
  dimension "d112" = 3
  dimension "d114" = 3
extrude "Extrusion17" add sketch "Sketch19" against normal blind 2 contours L26 L15 A1 L21 A8 L20 A7 L23 A4 L19 | L24 A6 L25 A9 L22 A2 L17 A3
sketch "Sketch20" plane through (-71.3, -18, 210.3756) normal (1, 0, 0) x (0, 0, -1)
  line L0 (100, 36) -> (1, 2)
  line L1 (1, 2) -> (1, 17)
  line L2 (102, 36) -> (100, 36)
  line L3 (1, 17) -> (100, 36)
  point P0 (210.3756, 18)
  dimension "d117" = 15
extrude "Extrusion18" add sketch "Sketch20" against normal blind 2
sketch "Sketch21" plane through (-71.3, -18, 210.3756) normal (1, 0, 0) x (0, 0, -1)
  line L0 (1, 2) -> (100, 2)
  line L1 (100, 36) -> (1, 17)
  line L2 (16, 2) -> (51, 2)
  line L3 (51, 2) -> (51, 11)
  line L4 (45, 17) -> (22, 17)
  line L5 (16, 11) -> (16, 2)
  line L6 (1, 17) -> (1, 2)
  arc A0 (22, 17) -> (16, 11) centre (22, 11) ccw
  arc A1 (51, 11) -> (45, 17) centre (45, 11) ccw
  arc A2 (16, 7) -> (21, 2) centre (21, 7) ccw
  arc A3 (46, 2) -> (51, 7) centre (46, 7) ccw
  point P0 (210.3756, 18)
  point P1 (21, 2)
  point P2 (46, 2)
  dimension "d120" = 15
  dimension "d121" = 15
  dimension "d122" = 50
  dimension "d123" = 6
  dimension "d124" = 5
  dimension "d125" = 5
extrude "Extrusion19" cut sketch "Sketch21" against normal blind 2 contours A2 L5 A0 L4 A1 L3 A3 L0
sketch "Sketch24" plane through (-211.3, -16, 108.3756) normal (0, 1, 0) x (1, 0, 0)
  circle A0 centre (129.5, -25.5) radius 1.35
  circle A1 centre (80.5, -25.5) radius 1.35
  circle A2 centre (80.5, -83.5) radius 1.35
  circle A3 centre (129.5, -83.5) radius 1.35
  circle A4 centre (129.5, -83.5) radius 3.5
  circle A5 centre (80.5, -83.5) radius 3.5
  circle A6 centre (80.5, -25.5) radius 3.5
  circle A7 centre (129.5, -25.5) radius 3.5
  point P0 (211.3, 108.3756)
  dimension "d128" = 7
  dimension "d129" = 7
  dimension "d130" = 7
  dimension "d131" = 7
extrude "Extrusion20" add sketch "Sketch24" along normal blind 2 contours A0 | A1 | A2 | A3 | A4 | A5 | A6 | A7
sketch "Sketch25" plane through (-130.8, -14, 133.8756) normal (0, 1, 0) x (1, 0, 0)
  circle A0 centre (49, 0) radius 3.5
  circle A1 centre (49, -58) radius 3.5
  circle A2 centre (0, -58) radius 3.5
  circle A3 centre (0, 0) radius 3.5
  point P0 (130.8, 133.8756)
hole "Hole1" at (-81.8, -14, 133.8756) at (-130.8, -14, 133.8756) at (-130.8, -14, 191.8756) at (-81.8, -14, 191.8756) direction (0, -1, 0) diameter 2 end through all
properties part number "RPI_HOUSING2" material "Rubber, Silicone"
